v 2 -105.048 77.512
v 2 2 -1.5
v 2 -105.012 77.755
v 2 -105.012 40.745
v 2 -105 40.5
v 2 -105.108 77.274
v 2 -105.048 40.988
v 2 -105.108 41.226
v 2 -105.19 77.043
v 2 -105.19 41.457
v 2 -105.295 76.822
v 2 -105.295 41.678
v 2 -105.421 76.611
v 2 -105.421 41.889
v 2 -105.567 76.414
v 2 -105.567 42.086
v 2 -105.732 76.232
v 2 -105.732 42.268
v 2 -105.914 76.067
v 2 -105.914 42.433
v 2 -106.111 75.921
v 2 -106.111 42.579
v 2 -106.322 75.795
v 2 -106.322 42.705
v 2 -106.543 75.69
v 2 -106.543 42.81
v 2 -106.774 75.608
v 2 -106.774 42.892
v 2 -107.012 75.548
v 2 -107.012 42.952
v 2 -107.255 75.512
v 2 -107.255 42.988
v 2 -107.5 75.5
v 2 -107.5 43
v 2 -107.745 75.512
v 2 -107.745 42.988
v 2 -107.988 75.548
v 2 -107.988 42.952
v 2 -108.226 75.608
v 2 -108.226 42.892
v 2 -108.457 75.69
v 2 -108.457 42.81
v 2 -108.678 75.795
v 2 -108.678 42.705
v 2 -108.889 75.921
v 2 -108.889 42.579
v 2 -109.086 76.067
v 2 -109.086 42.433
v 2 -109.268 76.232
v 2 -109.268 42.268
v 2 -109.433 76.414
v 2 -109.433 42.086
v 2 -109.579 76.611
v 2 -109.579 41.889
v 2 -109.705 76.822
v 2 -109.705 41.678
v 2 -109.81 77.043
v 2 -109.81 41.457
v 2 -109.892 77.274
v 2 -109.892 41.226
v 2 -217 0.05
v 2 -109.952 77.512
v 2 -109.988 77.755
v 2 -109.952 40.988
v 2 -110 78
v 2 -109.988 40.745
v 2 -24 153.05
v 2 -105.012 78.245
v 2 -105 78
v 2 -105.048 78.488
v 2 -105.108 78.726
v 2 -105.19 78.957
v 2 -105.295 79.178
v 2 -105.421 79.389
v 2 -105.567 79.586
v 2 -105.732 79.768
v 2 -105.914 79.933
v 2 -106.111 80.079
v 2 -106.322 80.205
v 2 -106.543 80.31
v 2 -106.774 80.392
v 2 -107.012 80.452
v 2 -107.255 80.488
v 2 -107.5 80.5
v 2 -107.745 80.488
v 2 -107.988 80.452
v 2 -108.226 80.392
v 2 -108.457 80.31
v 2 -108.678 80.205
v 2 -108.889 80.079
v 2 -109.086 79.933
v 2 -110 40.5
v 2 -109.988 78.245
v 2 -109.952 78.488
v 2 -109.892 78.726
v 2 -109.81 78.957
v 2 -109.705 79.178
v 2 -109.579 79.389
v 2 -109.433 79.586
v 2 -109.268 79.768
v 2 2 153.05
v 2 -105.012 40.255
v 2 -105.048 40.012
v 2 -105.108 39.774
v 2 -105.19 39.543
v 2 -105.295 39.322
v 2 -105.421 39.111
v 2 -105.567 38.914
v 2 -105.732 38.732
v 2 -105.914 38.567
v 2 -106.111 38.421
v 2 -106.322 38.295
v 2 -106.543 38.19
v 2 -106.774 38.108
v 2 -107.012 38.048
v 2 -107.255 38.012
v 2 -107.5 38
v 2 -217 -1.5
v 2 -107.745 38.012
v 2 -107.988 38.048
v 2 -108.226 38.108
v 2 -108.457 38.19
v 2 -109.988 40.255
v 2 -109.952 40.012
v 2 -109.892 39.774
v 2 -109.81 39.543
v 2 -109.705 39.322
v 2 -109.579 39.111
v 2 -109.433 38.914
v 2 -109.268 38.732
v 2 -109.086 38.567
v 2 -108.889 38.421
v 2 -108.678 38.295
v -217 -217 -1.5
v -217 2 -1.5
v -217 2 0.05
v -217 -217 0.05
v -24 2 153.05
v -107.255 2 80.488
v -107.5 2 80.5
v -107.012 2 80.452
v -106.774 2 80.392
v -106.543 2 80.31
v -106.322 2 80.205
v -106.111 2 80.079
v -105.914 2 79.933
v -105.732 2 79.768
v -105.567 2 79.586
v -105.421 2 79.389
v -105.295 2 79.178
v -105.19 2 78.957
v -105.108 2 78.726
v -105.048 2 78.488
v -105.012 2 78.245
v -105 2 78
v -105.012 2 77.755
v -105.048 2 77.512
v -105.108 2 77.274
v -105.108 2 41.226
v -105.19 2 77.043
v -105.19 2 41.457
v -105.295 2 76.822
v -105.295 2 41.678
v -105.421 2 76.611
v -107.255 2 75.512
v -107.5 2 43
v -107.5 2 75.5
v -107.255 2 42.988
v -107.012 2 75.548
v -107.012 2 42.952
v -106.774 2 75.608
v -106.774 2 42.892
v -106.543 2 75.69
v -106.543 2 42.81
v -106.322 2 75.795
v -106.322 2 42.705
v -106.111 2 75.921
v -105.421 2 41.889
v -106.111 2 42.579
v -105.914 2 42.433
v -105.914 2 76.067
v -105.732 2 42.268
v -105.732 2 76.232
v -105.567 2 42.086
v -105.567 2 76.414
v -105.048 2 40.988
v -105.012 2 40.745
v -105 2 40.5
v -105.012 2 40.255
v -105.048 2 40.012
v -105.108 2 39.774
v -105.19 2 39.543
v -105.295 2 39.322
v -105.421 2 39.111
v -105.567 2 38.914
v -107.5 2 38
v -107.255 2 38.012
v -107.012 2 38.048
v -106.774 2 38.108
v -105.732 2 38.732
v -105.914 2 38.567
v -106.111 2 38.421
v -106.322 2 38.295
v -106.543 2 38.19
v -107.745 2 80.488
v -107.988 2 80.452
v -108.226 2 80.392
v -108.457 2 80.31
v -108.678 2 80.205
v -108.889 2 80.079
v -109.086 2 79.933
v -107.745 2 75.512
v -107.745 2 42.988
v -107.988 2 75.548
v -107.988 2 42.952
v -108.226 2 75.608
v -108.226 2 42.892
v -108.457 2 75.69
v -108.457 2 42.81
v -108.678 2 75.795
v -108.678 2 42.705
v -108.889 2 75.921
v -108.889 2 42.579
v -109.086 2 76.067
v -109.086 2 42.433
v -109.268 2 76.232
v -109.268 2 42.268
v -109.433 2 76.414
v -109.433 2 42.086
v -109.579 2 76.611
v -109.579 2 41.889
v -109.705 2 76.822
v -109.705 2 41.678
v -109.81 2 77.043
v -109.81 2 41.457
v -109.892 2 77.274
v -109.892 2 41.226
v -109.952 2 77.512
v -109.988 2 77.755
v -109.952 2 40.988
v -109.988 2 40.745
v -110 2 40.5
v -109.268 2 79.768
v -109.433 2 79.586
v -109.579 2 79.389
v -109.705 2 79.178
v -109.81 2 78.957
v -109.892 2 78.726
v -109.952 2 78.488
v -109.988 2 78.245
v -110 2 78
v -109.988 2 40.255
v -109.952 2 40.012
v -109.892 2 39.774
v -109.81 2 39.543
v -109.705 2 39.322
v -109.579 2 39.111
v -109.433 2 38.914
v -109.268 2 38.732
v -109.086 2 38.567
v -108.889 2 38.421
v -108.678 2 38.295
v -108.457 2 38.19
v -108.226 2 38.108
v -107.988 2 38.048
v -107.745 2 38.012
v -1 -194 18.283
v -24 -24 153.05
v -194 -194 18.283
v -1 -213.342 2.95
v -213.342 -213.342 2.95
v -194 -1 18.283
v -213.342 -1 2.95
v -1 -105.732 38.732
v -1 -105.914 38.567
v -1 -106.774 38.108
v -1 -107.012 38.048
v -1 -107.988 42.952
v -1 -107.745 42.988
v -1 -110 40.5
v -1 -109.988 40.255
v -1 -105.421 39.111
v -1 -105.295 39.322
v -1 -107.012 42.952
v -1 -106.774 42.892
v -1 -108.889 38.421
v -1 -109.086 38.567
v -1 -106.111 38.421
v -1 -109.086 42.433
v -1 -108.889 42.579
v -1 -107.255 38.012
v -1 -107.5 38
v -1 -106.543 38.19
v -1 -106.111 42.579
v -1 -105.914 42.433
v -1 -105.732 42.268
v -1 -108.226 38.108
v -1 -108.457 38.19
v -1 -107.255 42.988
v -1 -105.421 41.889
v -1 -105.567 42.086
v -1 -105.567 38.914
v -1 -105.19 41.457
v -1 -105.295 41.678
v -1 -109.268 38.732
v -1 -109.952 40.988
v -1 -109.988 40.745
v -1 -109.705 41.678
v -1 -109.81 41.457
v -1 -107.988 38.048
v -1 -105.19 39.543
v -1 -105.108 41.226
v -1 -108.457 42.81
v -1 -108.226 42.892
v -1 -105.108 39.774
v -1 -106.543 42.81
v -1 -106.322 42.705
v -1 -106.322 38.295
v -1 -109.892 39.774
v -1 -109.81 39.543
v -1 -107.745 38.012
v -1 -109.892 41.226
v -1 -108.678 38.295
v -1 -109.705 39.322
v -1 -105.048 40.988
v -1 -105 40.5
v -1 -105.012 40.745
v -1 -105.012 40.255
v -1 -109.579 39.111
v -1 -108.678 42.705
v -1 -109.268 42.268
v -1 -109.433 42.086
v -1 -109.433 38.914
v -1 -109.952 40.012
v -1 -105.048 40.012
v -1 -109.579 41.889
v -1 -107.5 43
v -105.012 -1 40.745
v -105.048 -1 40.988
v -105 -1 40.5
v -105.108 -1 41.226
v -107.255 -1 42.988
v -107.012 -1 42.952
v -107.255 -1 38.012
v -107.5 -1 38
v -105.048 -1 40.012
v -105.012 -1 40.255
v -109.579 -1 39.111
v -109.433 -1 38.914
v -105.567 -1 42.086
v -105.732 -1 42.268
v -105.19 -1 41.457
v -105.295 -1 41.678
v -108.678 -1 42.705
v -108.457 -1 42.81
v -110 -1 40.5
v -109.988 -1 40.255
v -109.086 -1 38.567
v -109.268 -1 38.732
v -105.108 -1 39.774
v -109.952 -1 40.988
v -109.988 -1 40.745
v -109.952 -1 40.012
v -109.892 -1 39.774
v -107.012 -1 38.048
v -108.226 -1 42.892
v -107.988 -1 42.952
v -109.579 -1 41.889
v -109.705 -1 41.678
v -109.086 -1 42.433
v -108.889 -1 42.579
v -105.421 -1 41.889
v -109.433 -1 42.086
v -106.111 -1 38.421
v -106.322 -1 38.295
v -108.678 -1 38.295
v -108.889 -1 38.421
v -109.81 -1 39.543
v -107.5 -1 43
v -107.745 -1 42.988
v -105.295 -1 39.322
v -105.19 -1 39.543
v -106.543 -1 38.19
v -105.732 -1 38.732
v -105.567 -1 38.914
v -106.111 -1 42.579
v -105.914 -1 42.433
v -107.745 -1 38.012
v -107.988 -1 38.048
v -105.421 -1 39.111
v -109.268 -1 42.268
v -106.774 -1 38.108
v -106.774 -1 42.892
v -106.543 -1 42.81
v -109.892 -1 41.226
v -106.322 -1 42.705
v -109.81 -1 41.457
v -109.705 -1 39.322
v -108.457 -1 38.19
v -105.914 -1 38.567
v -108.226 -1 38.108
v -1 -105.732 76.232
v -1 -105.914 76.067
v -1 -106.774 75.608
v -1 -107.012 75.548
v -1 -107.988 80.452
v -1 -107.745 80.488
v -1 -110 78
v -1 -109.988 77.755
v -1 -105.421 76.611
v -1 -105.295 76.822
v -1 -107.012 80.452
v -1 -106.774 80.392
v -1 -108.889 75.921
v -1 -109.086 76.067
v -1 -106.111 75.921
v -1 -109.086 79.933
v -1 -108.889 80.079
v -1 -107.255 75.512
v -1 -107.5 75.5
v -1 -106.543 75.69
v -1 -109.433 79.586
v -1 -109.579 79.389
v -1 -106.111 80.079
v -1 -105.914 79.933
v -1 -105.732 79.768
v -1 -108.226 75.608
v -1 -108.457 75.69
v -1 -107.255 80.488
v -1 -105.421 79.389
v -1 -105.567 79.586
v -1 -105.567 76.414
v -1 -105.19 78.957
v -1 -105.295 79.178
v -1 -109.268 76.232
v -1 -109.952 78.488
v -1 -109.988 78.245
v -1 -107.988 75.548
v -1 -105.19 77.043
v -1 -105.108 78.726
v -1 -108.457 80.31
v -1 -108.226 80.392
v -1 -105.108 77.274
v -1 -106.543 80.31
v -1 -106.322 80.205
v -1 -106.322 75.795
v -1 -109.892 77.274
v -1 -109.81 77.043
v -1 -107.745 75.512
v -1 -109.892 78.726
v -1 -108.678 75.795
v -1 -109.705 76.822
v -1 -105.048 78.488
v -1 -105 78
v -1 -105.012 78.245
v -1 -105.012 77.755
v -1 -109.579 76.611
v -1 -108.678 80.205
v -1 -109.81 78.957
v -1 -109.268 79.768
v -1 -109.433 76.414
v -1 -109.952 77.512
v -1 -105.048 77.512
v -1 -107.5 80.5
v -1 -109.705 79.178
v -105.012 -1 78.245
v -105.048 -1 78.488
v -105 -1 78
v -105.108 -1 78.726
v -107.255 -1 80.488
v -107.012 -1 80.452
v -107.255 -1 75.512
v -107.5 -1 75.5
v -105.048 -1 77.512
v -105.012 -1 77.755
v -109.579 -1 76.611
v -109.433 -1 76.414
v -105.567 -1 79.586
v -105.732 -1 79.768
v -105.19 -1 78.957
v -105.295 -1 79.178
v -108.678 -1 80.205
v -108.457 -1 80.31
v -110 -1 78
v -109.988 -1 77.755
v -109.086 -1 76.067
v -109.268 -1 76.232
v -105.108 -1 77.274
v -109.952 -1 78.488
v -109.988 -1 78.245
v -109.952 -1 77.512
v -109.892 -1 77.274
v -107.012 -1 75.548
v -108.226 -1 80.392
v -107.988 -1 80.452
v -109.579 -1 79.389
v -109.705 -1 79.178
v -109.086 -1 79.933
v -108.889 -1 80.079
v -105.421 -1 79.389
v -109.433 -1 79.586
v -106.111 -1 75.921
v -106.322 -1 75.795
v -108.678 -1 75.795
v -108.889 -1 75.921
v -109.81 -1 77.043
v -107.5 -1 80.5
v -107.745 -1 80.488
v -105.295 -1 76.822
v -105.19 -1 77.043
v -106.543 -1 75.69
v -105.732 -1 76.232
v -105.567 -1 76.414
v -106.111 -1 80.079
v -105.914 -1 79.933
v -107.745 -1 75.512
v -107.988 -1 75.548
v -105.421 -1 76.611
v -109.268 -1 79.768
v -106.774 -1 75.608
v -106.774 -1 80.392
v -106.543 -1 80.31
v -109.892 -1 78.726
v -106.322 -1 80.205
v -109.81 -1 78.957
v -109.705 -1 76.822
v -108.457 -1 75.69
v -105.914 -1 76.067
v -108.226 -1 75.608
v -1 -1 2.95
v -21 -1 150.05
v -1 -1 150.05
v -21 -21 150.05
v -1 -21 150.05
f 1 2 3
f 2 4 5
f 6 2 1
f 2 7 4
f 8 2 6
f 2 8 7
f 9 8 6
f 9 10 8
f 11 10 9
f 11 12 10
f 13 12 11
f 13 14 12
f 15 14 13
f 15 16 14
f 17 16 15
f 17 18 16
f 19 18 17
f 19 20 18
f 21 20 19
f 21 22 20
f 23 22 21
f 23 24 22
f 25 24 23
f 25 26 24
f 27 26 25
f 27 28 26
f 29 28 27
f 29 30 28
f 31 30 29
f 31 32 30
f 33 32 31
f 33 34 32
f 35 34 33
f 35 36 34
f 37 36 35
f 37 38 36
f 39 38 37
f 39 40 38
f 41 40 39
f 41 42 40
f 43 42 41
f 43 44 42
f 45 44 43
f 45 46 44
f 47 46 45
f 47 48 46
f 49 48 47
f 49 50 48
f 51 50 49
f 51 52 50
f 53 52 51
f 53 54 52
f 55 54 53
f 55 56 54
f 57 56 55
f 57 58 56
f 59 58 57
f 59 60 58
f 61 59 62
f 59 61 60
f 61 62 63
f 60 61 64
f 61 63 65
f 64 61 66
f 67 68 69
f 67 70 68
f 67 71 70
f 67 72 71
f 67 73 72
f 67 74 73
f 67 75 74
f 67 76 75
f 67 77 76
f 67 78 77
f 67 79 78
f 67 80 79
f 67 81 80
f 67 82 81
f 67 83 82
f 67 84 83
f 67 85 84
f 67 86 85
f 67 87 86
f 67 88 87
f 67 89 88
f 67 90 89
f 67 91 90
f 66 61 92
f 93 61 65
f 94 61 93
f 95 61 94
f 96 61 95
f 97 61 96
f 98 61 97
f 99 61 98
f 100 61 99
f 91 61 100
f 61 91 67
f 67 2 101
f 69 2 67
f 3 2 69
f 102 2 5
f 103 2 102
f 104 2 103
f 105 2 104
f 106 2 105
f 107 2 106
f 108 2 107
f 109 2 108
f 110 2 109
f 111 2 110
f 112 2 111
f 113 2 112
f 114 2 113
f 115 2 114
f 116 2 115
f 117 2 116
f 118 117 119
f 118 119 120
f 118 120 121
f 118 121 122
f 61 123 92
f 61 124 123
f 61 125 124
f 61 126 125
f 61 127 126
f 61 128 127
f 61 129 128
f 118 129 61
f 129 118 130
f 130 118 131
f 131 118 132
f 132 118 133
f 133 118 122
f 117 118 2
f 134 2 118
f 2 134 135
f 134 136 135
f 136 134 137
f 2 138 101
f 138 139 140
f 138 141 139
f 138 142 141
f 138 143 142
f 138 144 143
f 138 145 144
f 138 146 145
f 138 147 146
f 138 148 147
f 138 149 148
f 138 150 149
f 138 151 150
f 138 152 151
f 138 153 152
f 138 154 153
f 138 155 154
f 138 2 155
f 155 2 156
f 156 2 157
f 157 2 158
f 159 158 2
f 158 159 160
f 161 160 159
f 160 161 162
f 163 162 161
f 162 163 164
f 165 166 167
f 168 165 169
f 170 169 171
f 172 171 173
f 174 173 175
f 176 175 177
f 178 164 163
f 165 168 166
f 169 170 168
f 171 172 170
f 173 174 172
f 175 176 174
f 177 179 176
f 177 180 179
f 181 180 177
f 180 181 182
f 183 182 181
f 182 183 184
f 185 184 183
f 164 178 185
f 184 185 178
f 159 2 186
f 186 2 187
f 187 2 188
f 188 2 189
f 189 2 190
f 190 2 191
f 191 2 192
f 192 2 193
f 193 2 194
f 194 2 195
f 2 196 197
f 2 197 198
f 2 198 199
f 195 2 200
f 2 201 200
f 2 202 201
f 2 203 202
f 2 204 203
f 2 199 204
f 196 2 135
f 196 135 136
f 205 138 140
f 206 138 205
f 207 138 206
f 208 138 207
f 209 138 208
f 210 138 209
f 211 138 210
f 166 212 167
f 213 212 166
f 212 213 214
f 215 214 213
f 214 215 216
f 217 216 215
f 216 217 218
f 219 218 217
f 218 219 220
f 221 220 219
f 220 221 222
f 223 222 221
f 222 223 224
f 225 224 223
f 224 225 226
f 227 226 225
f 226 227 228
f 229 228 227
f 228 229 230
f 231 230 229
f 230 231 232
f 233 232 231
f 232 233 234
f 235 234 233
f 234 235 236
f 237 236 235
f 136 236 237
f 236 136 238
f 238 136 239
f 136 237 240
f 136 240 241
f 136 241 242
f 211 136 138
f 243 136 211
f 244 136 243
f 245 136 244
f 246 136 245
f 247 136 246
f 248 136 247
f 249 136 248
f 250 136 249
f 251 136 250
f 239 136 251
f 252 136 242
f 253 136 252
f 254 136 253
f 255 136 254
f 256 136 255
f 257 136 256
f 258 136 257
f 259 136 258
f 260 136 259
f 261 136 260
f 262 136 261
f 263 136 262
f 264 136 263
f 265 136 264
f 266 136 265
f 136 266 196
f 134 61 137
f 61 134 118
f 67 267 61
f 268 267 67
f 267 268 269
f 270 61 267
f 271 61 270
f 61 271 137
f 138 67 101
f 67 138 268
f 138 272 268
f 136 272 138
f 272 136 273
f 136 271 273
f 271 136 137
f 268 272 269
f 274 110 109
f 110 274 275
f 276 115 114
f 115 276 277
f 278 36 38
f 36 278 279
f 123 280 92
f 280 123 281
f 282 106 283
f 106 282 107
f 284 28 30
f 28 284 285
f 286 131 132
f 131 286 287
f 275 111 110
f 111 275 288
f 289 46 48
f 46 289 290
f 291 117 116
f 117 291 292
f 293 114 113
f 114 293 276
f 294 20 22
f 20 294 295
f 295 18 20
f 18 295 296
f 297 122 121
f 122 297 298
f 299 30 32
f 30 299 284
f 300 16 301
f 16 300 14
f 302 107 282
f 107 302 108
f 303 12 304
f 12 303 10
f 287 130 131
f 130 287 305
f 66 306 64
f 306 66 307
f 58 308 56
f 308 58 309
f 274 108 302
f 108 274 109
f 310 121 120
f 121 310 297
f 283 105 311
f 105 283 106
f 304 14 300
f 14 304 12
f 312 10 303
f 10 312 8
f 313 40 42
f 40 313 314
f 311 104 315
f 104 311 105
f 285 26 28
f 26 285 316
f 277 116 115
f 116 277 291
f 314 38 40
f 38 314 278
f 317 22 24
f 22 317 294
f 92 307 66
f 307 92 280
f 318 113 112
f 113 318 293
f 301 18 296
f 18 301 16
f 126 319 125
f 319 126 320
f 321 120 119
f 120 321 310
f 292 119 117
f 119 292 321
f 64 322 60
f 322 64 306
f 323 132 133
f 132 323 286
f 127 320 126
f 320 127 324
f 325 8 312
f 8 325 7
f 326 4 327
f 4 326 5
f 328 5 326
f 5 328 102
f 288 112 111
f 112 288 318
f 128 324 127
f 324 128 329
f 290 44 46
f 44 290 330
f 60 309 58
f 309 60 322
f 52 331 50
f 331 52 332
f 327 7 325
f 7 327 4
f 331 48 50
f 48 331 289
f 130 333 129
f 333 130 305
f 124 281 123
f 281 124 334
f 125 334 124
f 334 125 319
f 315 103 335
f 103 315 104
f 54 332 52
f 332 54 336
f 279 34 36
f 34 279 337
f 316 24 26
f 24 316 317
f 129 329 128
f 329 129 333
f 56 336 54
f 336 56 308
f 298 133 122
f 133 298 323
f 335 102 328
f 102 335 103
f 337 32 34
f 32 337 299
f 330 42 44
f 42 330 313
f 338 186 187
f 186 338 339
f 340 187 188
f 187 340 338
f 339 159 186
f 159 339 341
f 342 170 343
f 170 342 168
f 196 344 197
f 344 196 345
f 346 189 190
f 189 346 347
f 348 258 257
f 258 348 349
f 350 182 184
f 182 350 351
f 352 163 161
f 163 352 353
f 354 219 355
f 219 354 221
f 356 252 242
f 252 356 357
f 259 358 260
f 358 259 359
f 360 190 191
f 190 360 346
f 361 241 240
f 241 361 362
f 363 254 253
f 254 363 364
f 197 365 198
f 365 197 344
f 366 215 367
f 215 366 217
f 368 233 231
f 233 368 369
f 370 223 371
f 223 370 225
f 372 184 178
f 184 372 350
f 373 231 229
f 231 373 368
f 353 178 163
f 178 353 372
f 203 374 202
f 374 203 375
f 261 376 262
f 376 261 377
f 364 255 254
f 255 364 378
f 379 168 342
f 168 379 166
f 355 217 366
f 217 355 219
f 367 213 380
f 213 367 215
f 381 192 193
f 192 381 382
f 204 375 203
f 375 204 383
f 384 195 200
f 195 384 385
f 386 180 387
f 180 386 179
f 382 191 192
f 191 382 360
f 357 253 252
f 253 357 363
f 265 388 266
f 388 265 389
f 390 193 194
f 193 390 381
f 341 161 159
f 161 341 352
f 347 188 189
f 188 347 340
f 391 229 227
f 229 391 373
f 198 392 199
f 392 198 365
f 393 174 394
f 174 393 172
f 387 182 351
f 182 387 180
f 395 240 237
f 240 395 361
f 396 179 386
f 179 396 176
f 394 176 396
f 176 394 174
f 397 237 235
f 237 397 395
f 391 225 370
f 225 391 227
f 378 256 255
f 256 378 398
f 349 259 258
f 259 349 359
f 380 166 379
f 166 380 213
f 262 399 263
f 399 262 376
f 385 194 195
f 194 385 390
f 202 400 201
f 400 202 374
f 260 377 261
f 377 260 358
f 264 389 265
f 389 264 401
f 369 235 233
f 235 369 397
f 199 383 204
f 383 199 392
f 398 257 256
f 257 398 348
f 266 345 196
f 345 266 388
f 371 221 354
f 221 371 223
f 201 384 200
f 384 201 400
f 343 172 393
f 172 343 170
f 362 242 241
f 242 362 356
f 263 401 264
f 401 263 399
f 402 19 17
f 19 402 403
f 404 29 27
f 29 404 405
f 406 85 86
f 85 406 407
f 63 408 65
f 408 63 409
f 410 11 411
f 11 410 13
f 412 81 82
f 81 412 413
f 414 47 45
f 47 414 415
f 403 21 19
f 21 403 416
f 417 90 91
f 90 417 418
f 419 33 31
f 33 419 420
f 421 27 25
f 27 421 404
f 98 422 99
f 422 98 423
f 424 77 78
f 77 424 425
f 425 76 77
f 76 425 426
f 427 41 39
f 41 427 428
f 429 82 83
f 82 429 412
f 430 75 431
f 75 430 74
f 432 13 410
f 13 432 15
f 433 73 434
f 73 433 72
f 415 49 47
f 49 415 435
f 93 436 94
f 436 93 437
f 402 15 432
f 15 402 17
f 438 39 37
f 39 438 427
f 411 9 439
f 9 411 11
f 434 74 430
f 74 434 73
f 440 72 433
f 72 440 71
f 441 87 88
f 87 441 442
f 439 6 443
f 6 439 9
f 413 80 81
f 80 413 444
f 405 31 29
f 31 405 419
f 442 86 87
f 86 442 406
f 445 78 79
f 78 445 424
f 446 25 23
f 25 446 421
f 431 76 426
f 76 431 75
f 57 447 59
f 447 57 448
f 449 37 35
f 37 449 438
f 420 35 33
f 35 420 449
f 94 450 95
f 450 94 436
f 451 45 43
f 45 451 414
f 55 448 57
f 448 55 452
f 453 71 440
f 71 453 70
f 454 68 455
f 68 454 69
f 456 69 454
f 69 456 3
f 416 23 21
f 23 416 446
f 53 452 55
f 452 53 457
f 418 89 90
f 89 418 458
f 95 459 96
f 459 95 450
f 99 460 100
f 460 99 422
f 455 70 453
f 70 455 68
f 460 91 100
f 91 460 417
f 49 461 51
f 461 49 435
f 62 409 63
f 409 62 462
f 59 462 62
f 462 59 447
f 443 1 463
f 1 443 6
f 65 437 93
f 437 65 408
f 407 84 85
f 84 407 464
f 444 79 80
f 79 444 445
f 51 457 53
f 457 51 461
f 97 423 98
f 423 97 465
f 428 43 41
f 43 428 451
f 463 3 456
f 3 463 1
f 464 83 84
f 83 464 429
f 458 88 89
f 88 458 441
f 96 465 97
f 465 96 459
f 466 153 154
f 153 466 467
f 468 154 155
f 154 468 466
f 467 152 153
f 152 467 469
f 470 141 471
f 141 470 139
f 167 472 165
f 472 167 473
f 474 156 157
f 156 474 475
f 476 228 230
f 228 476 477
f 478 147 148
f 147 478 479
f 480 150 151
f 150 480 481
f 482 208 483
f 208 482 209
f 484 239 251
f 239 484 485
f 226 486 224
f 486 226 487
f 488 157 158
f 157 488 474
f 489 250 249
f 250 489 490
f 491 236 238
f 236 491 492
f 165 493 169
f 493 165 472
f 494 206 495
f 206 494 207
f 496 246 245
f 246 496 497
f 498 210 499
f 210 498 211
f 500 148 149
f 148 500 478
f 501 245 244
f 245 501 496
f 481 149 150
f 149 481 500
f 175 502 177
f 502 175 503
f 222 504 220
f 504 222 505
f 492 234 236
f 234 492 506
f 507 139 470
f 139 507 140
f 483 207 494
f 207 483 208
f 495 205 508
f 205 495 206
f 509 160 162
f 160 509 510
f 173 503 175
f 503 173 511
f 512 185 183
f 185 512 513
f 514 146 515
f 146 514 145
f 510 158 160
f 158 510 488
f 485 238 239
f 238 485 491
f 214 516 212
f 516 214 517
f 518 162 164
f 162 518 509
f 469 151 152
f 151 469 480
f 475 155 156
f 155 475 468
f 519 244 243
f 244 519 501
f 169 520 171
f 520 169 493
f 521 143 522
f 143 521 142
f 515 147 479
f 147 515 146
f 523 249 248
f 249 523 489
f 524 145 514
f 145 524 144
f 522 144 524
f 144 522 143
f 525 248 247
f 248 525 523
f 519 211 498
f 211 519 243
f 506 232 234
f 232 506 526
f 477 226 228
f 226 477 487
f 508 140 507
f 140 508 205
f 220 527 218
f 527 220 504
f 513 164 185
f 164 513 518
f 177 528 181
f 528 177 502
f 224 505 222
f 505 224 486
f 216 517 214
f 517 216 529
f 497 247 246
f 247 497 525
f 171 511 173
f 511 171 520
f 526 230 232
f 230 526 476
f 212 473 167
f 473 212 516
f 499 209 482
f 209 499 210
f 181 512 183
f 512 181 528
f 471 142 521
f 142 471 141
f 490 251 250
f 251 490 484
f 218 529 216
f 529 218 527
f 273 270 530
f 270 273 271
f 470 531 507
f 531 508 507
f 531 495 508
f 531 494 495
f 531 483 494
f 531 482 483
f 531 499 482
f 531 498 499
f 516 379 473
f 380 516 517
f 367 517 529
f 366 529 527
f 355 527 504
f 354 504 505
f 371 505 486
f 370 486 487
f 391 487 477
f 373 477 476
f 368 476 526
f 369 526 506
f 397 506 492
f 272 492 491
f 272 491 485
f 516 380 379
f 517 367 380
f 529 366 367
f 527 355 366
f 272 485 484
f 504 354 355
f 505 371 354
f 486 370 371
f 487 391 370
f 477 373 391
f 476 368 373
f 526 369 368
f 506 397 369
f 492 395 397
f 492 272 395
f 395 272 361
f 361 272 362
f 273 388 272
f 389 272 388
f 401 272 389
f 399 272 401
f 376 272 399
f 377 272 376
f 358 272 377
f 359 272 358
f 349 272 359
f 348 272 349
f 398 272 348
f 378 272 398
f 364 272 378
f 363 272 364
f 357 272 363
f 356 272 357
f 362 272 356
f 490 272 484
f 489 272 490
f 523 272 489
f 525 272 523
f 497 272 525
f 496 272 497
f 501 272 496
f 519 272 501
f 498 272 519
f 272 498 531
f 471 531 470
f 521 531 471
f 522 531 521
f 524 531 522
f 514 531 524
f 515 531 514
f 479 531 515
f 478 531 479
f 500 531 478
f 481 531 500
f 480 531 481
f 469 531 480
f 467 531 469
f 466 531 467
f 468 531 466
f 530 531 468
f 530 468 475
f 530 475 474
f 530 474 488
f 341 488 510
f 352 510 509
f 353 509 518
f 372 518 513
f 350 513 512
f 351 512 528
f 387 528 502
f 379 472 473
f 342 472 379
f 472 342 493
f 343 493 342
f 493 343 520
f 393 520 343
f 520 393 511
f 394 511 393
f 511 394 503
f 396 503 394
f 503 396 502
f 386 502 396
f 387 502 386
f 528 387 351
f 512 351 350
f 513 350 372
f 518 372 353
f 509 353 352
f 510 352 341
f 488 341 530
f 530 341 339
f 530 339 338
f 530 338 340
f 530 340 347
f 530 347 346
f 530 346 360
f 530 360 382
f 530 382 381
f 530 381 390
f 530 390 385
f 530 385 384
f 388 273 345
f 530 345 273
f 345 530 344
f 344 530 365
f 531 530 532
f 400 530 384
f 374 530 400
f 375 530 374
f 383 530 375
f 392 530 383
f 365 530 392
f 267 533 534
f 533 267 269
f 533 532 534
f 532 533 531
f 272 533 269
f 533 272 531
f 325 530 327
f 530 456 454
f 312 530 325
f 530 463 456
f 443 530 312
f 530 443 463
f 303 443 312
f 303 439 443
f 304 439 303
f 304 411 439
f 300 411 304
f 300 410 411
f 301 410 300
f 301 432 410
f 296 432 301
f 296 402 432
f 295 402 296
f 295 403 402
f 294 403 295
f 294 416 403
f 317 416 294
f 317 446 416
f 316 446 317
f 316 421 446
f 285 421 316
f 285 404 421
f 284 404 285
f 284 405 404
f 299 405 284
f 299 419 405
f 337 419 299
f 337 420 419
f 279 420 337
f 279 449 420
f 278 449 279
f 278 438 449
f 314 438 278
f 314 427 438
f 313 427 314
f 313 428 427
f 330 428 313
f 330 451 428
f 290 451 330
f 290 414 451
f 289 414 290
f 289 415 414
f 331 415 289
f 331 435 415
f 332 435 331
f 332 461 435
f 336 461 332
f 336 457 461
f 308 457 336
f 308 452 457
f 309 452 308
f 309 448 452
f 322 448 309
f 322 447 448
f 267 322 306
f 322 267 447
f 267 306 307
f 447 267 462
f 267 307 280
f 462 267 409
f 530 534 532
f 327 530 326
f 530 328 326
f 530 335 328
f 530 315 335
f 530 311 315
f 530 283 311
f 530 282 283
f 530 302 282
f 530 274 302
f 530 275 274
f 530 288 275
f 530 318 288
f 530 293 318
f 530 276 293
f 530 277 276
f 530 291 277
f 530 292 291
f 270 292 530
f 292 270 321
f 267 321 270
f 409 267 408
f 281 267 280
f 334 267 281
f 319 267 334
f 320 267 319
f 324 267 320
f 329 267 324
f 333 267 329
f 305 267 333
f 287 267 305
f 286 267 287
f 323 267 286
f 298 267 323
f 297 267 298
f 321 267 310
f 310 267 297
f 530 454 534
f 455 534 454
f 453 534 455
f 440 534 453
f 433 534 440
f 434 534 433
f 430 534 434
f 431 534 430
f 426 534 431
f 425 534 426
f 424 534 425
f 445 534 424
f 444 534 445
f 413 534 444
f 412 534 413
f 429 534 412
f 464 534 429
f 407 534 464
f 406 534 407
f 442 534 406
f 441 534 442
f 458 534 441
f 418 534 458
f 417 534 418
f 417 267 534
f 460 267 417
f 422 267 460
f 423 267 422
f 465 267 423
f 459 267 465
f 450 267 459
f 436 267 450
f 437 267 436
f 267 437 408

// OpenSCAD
$fn = 64;
difference() {
	union() {
		difference() {
			translate(v = [-107.5, -107.5, 0]) {
				cube(center = true, size = [219.0, 219.0, 3]);
			}
			translate(v = [-107.5, -107.5, 1.5]) {
				cube(center = true, size = [219.0, 219.0, 3.1]);
			}
		}
		hull() {
			translate(v = [-107.5, -107.5, 0]) {
				cube(center = true, size = [219.0, 219.0, 0.1]);
			}
			translate(v = [-11.0, -11.0, 153]) {
				cube(center = true, size = [26.0, 26.0, 0.1]);
			}
		}
	}
	hull() {
		translate(v = [-107.5, -107.5, 3]) {
			cube(center = true, size = [213.0, 213.0, 0.1]);
		}
		translate(v = [-11.0, -11.0, 150]) {
			cube(center = true, size = [20.0, 20.0, 0.1]);
		}
	}
	union() {
		translate(v = [0, -107.5, 40.5]) {
			rotate(a = [0, 90, 0]) {
				cylinder(center = true, h = 30, r = 2.5);
			}
		}
		translate(v = [-107.5, 0, 40.5]) {
			rotate(a = [90, 0, 0]) {
				cylinder(center = true, h = 30, r = 2.5);
			}
		}
		translate(v = [0, -107.5, 78.0]) {
			rotate(a = [0, 90, 0]) {
				cylinder(center = true, h = 30, r = 2.5);
			}
		}
		translate(v = [-107.5, 0, 78.0]) {
			rotate(a = [90, 0, 0]) {
				cylinder(center = true, h = 30, r = 2.5);
			}
		}
		translate(v = [0, -107.5, 115.5]) {
			rotate(a = [0, 90, 0]) {
				cylinder(center = true, h = 30, r = 2.5);
			}
		}
		translate(v = [-107.5, 0, 115.5]) {
			rotate(a = [90, 0, 0]) {
				cylinder(center = true, h = 30, r = 2.5);
			}
		}
	}
}
